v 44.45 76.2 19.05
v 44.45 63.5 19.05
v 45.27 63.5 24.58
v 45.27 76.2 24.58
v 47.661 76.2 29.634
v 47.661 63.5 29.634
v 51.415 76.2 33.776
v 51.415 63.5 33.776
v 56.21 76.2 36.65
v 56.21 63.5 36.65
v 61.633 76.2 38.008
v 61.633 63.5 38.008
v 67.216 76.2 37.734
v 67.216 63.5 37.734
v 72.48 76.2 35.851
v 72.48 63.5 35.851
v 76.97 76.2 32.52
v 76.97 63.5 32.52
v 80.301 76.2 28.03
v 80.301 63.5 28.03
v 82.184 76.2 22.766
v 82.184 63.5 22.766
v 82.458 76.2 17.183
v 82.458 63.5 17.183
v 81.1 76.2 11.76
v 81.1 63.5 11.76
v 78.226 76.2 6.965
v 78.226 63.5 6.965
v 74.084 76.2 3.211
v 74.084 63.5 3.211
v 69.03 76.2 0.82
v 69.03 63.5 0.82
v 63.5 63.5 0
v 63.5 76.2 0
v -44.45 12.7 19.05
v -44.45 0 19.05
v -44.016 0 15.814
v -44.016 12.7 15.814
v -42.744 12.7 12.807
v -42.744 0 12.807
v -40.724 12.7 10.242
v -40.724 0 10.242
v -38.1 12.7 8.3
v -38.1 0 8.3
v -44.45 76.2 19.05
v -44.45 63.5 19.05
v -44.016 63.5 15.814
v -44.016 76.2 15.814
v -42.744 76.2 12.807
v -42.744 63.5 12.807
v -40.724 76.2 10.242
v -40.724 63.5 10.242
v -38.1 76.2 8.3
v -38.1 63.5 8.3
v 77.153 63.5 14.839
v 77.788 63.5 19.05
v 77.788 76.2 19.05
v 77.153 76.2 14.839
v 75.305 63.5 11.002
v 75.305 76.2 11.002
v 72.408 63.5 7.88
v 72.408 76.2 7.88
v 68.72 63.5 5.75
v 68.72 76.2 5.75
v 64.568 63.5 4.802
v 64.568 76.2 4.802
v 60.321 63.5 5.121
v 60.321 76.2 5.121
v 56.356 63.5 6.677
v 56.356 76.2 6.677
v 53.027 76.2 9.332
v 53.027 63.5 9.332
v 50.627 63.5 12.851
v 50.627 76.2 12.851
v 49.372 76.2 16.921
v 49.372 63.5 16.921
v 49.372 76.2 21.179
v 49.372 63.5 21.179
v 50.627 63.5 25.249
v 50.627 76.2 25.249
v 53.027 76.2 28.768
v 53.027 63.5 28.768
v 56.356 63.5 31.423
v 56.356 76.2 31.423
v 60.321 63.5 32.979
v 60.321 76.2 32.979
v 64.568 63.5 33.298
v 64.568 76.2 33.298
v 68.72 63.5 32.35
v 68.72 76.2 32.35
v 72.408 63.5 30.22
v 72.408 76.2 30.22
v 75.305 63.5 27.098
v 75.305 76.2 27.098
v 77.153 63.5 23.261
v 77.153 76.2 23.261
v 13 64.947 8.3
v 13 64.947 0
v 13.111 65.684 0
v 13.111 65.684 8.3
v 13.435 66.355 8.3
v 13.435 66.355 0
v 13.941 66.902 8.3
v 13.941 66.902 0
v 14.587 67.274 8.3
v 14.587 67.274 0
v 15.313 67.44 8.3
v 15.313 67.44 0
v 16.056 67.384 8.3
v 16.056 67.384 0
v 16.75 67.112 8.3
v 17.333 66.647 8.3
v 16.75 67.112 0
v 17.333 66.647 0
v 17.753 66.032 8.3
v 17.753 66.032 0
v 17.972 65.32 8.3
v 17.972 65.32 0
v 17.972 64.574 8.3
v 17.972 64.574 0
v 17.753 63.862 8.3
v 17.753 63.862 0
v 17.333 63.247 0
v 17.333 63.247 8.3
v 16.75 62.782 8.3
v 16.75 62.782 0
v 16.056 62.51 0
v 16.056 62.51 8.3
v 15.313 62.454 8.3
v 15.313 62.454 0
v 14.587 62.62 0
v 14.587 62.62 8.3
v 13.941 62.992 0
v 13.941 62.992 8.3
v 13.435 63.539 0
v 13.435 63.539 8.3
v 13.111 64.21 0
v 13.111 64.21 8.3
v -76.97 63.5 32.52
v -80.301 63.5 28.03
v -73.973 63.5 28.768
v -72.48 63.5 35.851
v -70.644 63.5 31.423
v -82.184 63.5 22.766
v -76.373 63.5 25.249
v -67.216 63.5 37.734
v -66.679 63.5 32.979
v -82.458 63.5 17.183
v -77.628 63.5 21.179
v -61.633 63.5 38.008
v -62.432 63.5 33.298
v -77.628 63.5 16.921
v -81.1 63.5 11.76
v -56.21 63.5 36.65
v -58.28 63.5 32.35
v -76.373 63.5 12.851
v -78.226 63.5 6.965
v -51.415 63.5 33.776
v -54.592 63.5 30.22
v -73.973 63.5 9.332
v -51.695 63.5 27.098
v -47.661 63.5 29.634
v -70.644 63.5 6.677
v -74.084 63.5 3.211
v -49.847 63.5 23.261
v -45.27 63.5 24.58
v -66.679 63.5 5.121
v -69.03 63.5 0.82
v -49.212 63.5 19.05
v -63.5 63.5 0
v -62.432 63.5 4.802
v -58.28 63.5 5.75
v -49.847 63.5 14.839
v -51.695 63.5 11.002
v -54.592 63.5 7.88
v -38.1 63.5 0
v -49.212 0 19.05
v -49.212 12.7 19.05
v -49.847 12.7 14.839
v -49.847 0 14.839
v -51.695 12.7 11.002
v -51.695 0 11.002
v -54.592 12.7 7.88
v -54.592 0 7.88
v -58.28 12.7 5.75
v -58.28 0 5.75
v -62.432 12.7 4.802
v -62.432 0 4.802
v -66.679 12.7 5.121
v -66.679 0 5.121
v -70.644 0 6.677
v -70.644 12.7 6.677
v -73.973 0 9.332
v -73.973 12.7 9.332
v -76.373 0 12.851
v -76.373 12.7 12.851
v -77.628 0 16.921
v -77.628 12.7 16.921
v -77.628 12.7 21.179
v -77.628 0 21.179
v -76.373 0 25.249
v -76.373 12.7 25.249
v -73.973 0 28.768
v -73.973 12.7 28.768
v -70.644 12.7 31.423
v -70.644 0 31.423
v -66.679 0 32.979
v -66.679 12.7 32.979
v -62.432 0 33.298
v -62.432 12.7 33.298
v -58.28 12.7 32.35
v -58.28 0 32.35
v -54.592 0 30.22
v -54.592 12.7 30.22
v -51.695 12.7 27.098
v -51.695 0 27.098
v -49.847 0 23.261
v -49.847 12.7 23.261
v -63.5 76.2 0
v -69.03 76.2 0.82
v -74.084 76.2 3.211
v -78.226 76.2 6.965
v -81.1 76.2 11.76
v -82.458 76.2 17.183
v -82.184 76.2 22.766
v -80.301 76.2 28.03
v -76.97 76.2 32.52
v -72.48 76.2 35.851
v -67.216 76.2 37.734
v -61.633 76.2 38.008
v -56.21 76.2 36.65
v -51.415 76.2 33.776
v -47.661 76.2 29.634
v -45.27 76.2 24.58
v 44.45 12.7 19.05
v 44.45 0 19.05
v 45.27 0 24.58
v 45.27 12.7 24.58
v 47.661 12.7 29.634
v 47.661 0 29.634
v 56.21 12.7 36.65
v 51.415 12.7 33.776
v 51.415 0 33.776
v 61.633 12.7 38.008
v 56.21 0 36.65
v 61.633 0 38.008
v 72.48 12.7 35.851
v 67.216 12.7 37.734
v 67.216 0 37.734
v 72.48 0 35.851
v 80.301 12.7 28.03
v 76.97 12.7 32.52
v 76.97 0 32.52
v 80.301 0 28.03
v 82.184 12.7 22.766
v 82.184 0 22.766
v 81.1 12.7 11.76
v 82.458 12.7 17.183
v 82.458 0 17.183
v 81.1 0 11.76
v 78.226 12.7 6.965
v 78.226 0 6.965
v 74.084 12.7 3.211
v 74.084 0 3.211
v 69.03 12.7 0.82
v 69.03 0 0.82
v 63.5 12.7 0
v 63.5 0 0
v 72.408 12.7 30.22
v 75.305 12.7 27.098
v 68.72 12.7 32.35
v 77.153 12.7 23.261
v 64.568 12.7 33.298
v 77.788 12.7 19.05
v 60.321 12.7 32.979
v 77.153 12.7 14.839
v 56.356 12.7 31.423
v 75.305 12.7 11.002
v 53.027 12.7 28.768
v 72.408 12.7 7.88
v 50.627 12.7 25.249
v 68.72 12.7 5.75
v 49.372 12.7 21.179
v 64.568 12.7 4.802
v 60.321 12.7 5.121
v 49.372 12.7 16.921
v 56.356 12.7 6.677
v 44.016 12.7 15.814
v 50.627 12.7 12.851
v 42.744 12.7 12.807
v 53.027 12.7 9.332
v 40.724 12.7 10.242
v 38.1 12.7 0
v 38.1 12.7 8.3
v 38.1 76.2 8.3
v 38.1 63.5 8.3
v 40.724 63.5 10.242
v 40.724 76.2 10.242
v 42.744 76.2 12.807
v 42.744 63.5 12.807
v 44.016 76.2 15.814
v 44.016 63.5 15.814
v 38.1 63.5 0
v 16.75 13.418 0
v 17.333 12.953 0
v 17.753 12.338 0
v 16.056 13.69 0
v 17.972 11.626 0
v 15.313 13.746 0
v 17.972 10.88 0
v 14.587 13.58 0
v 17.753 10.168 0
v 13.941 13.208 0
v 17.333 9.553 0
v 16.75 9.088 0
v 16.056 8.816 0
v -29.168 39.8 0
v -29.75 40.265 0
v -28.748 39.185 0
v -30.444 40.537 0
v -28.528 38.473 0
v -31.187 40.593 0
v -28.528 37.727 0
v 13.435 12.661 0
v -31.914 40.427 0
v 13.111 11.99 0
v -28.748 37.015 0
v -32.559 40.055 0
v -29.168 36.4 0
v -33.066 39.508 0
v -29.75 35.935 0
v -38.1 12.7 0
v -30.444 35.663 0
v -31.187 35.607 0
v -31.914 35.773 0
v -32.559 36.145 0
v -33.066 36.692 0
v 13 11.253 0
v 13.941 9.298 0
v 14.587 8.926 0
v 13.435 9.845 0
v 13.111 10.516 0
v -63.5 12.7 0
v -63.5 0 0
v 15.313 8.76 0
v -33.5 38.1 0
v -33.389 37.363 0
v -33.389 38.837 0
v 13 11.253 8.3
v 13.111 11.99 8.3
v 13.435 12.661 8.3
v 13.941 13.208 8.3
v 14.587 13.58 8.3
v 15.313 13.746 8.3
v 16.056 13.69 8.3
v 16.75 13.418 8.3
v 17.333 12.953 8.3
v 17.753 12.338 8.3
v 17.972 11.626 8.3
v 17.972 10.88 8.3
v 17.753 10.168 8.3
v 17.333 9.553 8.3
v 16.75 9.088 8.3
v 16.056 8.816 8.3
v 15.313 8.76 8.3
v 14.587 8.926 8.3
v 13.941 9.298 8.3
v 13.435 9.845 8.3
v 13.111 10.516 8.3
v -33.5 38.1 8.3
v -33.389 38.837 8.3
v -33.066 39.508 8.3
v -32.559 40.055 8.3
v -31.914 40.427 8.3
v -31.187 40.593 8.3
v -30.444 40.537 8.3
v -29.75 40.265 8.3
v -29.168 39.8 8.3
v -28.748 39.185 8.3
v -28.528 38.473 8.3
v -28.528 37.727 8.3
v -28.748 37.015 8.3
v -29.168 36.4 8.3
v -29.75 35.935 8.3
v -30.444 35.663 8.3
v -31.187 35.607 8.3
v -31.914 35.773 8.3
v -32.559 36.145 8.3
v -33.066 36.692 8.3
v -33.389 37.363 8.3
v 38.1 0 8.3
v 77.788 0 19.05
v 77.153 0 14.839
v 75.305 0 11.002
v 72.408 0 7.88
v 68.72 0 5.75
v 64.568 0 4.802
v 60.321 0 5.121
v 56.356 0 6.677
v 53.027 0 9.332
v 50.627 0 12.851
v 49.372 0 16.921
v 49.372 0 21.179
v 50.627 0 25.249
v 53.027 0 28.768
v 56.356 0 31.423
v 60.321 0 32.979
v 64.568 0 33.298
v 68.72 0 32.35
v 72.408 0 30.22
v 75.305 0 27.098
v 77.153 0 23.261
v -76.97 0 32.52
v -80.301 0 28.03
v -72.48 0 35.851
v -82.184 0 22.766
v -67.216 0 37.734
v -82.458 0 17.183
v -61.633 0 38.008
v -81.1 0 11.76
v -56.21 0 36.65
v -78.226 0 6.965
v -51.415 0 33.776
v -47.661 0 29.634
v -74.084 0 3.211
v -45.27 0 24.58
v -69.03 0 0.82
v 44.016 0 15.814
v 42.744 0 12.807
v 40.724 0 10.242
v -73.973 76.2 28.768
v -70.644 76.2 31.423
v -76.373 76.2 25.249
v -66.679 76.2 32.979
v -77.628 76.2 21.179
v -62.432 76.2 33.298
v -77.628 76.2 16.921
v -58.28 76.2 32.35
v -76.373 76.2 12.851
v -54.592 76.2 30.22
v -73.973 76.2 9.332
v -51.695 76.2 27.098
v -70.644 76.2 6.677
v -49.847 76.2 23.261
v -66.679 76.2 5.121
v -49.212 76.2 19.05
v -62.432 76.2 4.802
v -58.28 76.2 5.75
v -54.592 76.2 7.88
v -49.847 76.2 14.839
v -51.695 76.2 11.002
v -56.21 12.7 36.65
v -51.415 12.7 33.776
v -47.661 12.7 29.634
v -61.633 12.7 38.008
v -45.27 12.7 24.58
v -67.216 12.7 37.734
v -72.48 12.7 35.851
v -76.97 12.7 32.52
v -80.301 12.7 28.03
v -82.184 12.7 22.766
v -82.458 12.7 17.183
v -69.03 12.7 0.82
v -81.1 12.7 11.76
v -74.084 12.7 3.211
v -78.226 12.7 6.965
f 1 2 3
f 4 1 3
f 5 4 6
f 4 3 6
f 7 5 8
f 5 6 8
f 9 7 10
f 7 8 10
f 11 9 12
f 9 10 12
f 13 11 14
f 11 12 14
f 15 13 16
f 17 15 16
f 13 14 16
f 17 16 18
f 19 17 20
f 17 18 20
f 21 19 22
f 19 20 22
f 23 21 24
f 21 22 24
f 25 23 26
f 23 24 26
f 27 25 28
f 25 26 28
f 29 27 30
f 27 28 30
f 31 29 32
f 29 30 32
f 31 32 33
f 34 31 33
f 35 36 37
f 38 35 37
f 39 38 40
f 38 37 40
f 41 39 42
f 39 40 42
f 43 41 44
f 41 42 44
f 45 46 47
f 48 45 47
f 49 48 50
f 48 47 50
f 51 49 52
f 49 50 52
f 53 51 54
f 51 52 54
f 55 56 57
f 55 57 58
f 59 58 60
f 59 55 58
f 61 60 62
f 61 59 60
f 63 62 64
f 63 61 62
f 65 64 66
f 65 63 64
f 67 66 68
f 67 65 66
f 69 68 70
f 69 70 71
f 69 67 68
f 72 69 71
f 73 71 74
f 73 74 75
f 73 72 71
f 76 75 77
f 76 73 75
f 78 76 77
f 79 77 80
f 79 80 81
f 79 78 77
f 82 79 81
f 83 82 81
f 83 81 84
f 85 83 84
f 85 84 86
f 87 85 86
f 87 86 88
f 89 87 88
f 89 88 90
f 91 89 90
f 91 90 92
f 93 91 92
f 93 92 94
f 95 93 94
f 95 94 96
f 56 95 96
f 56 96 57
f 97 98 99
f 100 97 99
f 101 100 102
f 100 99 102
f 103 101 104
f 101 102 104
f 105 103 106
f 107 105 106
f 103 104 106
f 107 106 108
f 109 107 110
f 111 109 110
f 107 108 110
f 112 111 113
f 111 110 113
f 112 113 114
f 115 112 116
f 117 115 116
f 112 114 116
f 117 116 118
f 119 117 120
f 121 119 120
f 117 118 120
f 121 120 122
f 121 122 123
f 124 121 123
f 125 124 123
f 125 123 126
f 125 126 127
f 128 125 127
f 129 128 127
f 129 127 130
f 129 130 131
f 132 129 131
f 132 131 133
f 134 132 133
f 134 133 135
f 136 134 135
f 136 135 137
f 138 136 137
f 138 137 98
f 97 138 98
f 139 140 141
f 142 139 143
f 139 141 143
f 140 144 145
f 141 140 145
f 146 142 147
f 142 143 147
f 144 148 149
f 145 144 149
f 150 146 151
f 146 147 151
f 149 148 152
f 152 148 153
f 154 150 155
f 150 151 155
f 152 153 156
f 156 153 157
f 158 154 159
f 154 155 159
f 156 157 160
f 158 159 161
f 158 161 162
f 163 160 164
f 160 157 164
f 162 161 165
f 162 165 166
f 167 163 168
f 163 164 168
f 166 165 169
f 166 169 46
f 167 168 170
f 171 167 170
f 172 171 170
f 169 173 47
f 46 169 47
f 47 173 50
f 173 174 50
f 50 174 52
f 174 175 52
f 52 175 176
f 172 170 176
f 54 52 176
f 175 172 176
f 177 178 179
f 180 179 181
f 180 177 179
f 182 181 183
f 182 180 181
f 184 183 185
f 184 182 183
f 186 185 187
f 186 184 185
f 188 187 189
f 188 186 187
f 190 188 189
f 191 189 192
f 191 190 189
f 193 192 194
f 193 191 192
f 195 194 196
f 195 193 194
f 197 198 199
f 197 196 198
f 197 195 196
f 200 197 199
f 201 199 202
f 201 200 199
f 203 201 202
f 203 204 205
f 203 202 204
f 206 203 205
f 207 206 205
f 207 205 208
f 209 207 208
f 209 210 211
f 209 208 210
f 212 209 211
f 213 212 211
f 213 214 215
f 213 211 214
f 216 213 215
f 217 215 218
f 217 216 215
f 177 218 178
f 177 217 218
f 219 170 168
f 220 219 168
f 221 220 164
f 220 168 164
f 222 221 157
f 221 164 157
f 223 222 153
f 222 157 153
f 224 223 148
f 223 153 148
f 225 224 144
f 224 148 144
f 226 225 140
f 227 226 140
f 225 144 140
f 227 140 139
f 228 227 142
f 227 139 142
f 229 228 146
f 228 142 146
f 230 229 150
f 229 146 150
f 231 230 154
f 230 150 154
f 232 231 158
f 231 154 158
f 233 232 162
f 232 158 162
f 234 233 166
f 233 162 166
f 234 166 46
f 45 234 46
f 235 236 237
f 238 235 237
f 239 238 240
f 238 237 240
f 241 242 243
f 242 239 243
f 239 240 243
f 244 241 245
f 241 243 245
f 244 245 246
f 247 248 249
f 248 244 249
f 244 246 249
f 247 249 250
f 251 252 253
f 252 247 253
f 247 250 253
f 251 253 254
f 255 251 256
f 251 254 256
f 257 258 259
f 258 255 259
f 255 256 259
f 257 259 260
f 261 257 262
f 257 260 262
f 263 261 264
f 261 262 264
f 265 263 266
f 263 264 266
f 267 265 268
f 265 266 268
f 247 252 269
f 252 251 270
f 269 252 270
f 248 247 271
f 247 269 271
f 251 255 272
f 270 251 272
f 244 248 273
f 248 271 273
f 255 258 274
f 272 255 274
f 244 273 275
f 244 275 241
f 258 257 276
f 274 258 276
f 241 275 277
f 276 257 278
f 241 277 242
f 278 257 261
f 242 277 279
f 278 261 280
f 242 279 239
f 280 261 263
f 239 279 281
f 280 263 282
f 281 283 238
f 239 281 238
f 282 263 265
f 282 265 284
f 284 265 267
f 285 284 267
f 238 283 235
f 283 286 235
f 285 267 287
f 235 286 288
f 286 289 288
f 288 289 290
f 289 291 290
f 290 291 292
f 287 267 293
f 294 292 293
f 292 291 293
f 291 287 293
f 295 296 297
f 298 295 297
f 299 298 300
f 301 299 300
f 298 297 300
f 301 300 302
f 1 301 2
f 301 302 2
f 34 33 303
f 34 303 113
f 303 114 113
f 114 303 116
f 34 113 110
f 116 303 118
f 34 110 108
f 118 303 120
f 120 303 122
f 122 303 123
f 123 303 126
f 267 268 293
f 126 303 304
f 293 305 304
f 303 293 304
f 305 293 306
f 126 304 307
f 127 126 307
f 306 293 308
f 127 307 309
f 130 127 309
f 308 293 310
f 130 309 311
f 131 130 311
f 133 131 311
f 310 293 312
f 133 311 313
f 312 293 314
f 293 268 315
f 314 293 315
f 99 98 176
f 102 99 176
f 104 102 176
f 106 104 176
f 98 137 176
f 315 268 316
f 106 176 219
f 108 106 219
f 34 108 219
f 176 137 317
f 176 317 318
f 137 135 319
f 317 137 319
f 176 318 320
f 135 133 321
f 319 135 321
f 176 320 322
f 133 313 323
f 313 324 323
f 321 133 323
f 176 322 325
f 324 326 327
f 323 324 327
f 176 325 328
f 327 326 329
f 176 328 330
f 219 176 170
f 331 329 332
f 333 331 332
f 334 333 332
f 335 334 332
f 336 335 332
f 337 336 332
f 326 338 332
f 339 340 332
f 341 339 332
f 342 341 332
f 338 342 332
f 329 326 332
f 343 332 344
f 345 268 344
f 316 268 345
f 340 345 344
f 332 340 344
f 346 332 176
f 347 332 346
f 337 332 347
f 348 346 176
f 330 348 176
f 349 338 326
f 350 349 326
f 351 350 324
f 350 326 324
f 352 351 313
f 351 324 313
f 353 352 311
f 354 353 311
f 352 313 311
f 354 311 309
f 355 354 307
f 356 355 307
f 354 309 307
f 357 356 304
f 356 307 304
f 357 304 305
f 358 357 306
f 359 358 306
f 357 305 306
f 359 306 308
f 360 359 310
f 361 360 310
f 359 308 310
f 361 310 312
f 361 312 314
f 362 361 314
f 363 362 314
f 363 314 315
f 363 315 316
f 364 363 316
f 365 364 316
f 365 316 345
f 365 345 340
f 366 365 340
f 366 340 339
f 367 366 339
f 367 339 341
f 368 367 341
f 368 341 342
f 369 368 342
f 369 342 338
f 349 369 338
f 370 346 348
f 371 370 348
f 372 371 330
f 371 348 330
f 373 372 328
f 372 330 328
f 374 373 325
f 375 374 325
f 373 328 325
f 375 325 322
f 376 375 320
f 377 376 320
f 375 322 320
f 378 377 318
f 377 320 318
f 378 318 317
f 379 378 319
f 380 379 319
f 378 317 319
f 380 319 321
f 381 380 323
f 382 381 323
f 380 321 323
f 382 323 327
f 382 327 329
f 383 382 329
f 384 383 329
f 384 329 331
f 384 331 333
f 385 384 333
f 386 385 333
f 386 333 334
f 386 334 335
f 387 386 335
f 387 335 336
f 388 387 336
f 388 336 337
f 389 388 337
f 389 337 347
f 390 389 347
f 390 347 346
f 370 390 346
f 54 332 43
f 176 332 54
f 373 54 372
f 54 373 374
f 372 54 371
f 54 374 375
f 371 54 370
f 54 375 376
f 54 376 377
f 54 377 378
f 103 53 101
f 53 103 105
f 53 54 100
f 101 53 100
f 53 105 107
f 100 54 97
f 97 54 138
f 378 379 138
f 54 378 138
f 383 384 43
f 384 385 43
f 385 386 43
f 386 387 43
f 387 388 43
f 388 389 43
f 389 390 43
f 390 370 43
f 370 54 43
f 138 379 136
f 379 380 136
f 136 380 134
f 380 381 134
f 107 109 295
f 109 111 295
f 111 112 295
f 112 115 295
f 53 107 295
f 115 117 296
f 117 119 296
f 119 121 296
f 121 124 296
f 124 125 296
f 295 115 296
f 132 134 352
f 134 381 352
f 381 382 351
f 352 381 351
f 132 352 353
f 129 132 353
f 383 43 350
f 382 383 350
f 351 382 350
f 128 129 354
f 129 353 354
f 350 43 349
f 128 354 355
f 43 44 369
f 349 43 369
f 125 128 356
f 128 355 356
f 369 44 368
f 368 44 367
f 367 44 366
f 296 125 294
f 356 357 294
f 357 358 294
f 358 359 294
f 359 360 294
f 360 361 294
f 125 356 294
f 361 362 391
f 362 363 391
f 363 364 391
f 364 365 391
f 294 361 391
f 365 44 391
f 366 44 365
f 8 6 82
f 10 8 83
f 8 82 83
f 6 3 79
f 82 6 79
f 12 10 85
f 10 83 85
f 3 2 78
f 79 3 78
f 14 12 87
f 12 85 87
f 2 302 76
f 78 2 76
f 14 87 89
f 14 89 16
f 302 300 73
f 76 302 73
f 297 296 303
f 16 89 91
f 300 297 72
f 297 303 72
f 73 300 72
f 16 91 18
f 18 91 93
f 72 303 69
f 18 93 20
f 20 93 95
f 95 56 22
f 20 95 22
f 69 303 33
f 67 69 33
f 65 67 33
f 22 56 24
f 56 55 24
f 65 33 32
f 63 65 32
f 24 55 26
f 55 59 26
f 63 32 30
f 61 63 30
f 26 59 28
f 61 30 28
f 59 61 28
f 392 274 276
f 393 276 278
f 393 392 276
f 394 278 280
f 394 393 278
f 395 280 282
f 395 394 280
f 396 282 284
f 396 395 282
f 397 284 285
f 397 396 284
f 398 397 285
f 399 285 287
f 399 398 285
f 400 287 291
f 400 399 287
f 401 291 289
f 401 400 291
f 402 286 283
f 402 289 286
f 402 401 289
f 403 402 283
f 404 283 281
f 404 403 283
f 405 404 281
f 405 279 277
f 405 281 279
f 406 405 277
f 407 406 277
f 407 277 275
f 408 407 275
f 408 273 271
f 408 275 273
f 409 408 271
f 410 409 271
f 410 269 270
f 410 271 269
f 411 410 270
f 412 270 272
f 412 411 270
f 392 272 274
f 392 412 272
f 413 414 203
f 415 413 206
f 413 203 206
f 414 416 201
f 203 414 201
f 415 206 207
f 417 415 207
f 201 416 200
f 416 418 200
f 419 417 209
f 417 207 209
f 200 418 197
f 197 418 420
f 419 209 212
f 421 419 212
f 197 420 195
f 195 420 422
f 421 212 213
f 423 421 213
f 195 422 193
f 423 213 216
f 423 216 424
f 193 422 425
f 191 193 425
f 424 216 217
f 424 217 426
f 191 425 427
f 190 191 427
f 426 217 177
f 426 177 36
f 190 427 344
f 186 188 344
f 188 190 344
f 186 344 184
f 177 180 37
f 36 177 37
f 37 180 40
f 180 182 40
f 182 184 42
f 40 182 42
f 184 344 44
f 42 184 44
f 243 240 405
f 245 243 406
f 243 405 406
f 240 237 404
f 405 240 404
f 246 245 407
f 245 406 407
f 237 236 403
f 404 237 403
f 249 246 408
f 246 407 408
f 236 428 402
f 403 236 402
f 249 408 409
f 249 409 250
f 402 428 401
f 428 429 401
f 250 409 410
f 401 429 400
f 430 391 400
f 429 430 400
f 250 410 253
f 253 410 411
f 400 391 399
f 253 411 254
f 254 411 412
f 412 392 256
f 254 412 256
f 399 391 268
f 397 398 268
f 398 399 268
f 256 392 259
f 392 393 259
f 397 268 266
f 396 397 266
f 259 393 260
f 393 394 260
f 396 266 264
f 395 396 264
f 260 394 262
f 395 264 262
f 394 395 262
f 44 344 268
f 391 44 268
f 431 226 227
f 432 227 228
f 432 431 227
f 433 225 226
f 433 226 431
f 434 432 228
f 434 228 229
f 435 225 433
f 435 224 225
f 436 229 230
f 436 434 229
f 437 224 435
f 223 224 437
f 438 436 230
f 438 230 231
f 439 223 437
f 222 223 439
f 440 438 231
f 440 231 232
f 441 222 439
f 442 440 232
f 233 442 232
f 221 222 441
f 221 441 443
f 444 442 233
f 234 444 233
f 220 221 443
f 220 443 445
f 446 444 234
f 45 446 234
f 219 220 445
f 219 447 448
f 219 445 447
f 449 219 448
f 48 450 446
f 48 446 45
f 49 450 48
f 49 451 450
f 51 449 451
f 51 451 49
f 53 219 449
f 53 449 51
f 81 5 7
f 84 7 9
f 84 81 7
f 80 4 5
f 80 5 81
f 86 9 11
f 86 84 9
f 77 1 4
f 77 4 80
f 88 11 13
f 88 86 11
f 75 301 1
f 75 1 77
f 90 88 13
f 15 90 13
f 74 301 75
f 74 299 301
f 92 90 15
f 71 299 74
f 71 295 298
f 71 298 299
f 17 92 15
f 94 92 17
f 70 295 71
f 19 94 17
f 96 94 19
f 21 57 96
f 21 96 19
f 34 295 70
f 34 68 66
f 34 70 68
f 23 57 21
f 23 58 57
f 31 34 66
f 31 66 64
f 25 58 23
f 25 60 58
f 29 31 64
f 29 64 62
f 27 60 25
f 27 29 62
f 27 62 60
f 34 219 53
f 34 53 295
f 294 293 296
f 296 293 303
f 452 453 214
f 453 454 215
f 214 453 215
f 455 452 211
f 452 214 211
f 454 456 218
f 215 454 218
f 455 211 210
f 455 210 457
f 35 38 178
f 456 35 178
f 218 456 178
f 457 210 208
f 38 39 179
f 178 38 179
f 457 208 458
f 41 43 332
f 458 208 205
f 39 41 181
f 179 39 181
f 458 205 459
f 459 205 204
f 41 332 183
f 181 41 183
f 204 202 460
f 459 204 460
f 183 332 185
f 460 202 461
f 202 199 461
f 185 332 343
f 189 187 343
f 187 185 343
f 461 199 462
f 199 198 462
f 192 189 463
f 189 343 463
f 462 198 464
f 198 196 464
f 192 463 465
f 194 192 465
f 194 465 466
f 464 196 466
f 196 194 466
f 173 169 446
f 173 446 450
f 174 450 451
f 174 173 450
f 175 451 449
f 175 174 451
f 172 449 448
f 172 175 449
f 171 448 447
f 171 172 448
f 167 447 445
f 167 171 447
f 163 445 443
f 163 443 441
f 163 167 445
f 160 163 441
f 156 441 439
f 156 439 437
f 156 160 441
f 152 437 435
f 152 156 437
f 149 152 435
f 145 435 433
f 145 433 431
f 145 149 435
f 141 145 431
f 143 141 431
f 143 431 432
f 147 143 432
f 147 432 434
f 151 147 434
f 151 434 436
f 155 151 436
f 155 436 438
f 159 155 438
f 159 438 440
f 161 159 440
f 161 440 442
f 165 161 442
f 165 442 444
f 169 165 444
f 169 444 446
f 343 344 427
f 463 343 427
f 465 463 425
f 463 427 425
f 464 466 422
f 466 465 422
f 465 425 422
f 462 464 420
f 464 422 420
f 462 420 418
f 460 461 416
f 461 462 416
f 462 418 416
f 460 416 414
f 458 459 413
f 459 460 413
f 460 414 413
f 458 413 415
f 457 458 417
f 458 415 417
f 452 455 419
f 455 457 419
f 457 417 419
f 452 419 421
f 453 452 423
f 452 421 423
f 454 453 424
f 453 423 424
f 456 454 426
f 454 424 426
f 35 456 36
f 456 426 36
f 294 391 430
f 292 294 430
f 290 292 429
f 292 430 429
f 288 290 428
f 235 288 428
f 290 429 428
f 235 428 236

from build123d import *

# Parameters (mm, degrees)
SKETCH1_R               = 14.2875
BOSS_EXTRUDE1_DEPTH     = 76.2
SKETCH2_W               = 25.4
SKETCH2_H               = 50.8
SKETCH2_W_2             = 104.590829903
SKETCH2_W_3             = 68.699540571
SKETCH2_R               = 2.5
CUT_EXTRUDE1_DEPTH      = 1
CUT_EXTRUDE1_DEPTH_BACK = 39.1


with BuildPart() as part:
    # Sketch1 → Boss-Extrude1 (new body)
    with BuildSketch(Plane(origin=(0, 0, 0), x_dir=(1, 0, 0), z_dir=(0, 1, 0))):
        with BuildLine():
            Line((63.5, 0), (-63.5, 0))
            ThreePointArc((-63.5, 0), (-76.970384182, -32.520384182), (-44.45, -19.05))
            ThreePointArc((-44.45, -19.05), (-42.743933719, -12.807304268), (-38.1, -8.3))
            Line((-38.1, -8.3), (38.1, -8.3))
            ThreePointArc((38.1, -8.3), (42.743933719, -12.807304268), (44.45, -19.05))
            ThreePointArc((44.45, -19.05), (76.970384182, -32.520384182), (63.5, 0))
        make_face()
        with Locations((-63.5, -19.05)):
            Circle(SKETCH1_R, mode=Mode.SUBTRACT)
        with Locations((63.5, -19.05)):
            Circle(SKETCH1_R, mode=Mode.SUBTRACT)
    extrude(amount=BOSS_EXTRUDE1_DEPTH)

    # Sketch2 → Cut-Extrude1 (cut, two sides)
    with BuildSketch(Plane(origin=(0, 0, 0), x_dir=(-1, 0, 0), z_dir=(0, 0, -1))) as cut_extrude1_sk:
        with Locations((-50.8, 38.1)):
            Rectangle(SKETCH2_W, SKETCH2_H)
        with Locations((-115.795414952, 38.1)):
            Rectangle(SKETCH2_W_2, SKETCH2_H)
        with Locations((50.8, 38.1)):
            Rectangle(SKETCH2_W, SKETCH2_H)
        with Locations((97.849770285, 38.1)):
            Rectangle(SKETCH2_W_3, SKETCH2_H)
        with Locations((-15.500122677, 64.947)):
            Circle(SKETCH2_R)
        with Locations((-15.500122677, 11.253)):
            Circle(SKETCH2_R)
        with Locations((31.000245354, 38.1)):
            Circle(SKETCH2_R)
    extrude(amount=CUT_EXTRUDE1_DEPTH, mode=Mode.SUBTRACT)
    extrude(cut_extrude1_sk.sketch, amount=-CUT_EXTRUDE1_DEPTH_BACK, mode=Mode.SUBTRACT)


solid = part.part
